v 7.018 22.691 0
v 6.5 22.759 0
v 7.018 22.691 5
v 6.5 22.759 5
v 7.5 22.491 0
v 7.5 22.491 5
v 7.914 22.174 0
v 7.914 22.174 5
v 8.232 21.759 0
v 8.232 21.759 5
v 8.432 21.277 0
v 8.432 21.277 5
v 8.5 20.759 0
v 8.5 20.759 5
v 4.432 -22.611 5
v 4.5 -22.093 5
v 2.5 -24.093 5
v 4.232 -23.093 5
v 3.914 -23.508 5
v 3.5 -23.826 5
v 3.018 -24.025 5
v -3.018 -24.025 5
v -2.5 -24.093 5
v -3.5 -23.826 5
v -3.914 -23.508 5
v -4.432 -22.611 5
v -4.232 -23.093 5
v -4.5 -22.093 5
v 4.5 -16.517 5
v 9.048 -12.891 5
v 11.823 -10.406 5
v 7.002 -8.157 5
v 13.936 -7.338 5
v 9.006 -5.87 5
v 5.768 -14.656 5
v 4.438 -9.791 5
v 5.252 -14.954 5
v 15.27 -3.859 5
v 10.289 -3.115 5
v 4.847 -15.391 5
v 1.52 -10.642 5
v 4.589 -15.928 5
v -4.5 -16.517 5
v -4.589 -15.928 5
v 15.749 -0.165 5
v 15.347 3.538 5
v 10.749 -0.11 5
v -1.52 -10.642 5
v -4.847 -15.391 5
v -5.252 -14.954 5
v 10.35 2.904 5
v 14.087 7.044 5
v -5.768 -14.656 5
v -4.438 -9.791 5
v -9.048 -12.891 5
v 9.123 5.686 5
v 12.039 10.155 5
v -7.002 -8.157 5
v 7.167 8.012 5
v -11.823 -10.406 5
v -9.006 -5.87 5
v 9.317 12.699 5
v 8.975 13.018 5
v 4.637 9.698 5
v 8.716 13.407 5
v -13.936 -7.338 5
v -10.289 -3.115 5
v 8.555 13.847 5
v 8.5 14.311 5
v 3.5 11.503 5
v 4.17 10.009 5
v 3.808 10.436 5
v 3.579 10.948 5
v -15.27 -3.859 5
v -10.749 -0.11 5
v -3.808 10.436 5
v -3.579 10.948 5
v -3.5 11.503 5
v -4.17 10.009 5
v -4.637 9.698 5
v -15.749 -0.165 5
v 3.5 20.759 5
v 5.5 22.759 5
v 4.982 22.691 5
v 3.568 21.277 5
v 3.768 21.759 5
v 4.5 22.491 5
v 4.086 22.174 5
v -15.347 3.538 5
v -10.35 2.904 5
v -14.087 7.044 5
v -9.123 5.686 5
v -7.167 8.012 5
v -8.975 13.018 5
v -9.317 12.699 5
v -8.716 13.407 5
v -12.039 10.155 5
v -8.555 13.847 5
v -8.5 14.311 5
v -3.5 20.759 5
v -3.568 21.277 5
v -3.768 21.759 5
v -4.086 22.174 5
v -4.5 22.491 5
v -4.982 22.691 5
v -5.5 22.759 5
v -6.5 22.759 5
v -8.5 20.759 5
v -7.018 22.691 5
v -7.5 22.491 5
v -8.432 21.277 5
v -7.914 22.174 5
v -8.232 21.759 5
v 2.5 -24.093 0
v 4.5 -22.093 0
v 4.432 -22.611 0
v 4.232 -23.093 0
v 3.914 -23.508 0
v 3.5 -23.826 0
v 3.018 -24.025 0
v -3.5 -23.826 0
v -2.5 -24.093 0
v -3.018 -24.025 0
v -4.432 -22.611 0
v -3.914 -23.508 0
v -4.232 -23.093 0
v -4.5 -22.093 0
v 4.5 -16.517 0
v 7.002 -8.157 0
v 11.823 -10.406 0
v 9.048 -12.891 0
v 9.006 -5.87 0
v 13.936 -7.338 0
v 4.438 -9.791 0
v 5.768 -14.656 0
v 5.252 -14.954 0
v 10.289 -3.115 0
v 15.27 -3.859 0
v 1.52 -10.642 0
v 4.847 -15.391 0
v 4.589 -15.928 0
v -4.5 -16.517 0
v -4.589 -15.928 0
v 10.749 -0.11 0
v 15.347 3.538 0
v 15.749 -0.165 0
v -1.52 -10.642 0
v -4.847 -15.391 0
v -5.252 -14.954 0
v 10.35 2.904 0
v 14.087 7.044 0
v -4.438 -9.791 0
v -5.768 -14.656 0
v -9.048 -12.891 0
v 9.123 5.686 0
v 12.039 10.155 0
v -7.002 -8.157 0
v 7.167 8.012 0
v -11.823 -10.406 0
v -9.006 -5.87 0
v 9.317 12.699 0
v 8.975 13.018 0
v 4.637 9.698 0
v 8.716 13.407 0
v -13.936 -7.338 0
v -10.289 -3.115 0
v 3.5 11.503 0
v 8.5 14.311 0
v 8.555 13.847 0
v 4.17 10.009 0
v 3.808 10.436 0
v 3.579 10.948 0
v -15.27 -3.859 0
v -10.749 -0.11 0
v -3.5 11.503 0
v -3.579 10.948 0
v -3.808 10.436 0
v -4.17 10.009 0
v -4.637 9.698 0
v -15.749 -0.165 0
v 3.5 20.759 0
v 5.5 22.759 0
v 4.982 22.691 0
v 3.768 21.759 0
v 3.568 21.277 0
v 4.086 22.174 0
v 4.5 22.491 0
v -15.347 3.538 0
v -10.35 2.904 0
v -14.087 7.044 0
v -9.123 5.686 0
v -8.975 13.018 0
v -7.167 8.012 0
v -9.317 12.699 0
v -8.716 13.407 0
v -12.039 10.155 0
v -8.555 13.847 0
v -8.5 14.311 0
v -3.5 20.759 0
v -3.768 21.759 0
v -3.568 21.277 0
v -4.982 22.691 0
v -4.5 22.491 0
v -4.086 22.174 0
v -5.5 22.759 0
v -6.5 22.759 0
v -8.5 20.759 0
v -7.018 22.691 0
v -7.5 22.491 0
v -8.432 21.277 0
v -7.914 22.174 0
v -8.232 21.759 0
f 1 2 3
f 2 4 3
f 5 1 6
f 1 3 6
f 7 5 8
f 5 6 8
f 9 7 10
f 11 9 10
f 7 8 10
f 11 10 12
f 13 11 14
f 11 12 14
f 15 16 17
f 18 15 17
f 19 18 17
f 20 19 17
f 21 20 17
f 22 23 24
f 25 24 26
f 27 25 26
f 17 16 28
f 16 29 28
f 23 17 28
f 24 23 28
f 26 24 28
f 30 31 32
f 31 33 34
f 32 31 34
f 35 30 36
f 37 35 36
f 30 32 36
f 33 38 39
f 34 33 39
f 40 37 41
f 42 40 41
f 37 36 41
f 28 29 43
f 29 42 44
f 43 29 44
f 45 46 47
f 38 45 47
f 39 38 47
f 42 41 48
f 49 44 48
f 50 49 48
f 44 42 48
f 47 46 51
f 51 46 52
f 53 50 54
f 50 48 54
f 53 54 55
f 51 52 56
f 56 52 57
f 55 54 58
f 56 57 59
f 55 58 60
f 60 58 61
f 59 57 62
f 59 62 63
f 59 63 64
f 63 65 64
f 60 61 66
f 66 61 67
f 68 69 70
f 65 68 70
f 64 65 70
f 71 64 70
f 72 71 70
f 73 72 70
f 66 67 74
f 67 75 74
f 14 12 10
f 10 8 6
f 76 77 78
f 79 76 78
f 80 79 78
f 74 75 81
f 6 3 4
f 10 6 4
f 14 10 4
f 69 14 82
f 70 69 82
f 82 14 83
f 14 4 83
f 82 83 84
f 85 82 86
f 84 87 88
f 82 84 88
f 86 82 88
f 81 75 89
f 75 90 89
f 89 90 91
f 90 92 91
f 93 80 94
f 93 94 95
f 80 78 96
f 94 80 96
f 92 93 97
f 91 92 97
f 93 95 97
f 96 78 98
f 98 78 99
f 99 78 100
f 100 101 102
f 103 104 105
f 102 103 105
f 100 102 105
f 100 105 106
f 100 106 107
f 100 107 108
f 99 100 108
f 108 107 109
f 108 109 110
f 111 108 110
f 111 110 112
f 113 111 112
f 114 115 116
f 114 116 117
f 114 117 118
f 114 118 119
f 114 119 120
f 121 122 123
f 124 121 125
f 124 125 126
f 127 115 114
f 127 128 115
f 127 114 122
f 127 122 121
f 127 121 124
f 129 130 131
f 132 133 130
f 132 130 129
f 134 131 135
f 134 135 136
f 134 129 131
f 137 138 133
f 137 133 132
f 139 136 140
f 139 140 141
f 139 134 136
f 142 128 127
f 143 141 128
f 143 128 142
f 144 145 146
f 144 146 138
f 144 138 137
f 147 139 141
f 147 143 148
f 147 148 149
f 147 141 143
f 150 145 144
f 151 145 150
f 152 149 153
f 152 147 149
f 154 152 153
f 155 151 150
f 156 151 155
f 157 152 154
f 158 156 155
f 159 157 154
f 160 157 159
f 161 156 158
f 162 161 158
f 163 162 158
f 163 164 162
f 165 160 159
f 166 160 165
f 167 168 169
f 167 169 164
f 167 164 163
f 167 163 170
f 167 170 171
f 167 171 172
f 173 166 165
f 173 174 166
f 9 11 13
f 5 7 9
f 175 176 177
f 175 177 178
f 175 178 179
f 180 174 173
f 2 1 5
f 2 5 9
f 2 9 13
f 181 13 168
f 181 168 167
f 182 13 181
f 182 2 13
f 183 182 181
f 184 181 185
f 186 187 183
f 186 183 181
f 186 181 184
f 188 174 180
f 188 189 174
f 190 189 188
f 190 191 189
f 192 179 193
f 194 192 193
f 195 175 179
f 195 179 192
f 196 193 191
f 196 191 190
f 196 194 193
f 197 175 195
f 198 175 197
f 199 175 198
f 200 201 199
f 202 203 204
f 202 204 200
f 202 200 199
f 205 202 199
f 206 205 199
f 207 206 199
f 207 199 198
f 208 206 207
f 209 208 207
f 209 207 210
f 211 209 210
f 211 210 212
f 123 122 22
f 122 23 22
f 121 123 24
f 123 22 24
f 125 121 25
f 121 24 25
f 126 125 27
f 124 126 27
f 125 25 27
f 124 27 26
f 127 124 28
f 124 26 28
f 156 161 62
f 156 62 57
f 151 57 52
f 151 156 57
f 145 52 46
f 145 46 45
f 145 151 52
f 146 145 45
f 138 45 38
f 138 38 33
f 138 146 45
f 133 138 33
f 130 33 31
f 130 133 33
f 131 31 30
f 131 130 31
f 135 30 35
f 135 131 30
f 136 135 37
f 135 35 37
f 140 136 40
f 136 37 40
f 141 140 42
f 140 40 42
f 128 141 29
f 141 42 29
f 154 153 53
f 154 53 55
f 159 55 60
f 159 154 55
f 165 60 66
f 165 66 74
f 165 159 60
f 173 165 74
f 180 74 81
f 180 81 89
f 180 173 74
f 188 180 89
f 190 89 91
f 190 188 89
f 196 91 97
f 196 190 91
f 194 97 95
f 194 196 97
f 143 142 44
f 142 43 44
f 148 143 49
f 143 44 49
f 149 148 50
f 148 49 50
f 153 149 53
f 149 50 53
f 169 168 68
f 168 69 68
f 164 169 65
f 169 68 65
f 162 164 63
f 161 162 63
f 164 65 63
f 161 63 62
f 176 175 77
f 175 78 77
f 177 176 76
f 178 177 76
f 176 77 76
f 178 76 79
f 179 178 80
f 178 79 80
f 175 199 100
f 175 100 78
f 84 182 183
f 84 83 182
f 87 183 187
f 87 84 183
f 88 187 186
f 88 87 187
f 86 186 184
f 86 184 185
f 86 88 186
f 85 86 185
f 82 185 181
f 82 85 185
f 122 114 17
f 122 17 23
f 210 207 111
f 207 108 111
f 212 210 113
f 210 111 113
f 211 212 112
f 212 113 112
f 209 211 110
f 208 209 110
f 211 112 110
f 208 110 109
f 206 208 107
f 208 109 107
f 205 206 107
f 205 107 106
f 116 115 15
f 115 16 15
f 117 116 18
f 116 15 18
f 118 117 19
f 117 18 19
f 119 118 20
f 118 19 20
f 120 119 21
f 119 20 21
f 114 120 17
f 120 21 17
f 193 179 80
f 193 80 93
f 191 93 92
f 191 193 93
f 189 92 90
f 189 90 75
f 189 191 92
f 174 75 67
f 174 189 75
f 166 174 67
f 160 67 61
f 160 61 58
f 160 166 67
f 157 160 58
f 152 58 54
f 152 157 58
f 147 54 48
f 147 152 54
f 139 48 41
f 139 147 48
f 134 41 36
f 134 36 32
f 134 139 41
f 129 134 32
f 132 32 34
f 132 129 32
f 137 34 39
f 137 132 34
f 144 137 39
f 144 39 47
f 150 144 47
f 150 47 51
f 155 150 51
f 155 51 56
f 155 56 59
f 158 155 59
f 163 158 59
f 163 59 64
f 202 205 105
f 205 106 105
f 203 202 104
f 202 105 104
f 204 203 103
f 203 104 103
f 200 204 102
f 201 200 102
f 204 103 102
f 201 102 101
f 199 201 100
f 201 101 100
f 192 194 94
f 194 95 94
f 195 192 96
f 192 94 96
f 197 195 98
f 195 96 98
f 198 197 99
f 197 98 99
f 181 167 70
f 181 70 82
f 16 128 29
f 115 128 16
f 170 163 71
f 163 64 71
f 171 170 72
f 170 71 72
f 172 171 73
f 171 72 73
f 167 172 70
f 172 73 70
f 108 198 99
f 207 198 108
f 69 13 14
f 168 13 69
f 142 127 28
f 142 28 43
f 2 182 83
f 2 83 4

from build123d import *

# Parameters (mm, degrees)
BOSS_EXTRUDE1_DEPTH = 5
FILLET1_R           = 2


with BuildPart() as part:
    # Sketch1 → Boss-Extrude1 (new body)
    with BuildSketch(Plane.XY):
        with BuildLine():
            Line((3.5, 22.759430606), (8.5, 22.759430606))
            Line((8.5, 22.759430606), (8.5, 13.259430606))
            ThreePointArc((8.5, 13.259430606), (15.595562994, -2.200207922), (4.5, -15.093458848))
            Line((4.5, -15.093458848), (4.5, -24.093458848))
            Line((4.5, -24.093458848), (-4.5, -24.093458848))
            Line((-4.5, -24.093458848), (-4.5, -15.093458848))
            ThreePointArc((-4.5, -15.093458848), (-15.595562994, -2.200207922), (-8.5, 13.259430606))
            Line((-8.5, 13.259430606), (-8.5, 22.759430606))
            Line((-8.5, 22.759430606), (-3.5, 22.759430606))
            Line((-3.5, 22.759430606), (-3.5, 10.164275675))
            ThreePointArc((-3.5, 10.164275675), (0, -10.75), (3.5, 10.164275675))
            Line((3.5, 10.164275675), (3.5, 22.759430606))
        make_face()
    extrude(amount=BOSS_EXTRUDE1_DEPTH)

    # Fillet1
    fillet1_edges = [part.edges().sort_by_distance(p)[0] for p in [
        (4.5, -15.093458848, 2.5),
        (4.5, -24.093458848, 2.5),
        (-4.5, -24.093458848, 2.5),
        (-4.5, -15.093458848, 2.5),
        (-8.5, 13.259430606, 2.5),
        (-8.5, 22.759430606, 2.5),
        (-3.5, 22.759430606, 2.5),
        (-3.5, 10.164275675, 2.5),
        (3.5, 10.164275675, 2.5),
        (3.5, 22.759430606, 2.5),
        (8.5, 22.759430606, 2.5),
        (8.5, 13.259430606, 2.5),
    ]]
    fillet(fillet1_edges, radius=FILLET1_R)


solid = part.part
